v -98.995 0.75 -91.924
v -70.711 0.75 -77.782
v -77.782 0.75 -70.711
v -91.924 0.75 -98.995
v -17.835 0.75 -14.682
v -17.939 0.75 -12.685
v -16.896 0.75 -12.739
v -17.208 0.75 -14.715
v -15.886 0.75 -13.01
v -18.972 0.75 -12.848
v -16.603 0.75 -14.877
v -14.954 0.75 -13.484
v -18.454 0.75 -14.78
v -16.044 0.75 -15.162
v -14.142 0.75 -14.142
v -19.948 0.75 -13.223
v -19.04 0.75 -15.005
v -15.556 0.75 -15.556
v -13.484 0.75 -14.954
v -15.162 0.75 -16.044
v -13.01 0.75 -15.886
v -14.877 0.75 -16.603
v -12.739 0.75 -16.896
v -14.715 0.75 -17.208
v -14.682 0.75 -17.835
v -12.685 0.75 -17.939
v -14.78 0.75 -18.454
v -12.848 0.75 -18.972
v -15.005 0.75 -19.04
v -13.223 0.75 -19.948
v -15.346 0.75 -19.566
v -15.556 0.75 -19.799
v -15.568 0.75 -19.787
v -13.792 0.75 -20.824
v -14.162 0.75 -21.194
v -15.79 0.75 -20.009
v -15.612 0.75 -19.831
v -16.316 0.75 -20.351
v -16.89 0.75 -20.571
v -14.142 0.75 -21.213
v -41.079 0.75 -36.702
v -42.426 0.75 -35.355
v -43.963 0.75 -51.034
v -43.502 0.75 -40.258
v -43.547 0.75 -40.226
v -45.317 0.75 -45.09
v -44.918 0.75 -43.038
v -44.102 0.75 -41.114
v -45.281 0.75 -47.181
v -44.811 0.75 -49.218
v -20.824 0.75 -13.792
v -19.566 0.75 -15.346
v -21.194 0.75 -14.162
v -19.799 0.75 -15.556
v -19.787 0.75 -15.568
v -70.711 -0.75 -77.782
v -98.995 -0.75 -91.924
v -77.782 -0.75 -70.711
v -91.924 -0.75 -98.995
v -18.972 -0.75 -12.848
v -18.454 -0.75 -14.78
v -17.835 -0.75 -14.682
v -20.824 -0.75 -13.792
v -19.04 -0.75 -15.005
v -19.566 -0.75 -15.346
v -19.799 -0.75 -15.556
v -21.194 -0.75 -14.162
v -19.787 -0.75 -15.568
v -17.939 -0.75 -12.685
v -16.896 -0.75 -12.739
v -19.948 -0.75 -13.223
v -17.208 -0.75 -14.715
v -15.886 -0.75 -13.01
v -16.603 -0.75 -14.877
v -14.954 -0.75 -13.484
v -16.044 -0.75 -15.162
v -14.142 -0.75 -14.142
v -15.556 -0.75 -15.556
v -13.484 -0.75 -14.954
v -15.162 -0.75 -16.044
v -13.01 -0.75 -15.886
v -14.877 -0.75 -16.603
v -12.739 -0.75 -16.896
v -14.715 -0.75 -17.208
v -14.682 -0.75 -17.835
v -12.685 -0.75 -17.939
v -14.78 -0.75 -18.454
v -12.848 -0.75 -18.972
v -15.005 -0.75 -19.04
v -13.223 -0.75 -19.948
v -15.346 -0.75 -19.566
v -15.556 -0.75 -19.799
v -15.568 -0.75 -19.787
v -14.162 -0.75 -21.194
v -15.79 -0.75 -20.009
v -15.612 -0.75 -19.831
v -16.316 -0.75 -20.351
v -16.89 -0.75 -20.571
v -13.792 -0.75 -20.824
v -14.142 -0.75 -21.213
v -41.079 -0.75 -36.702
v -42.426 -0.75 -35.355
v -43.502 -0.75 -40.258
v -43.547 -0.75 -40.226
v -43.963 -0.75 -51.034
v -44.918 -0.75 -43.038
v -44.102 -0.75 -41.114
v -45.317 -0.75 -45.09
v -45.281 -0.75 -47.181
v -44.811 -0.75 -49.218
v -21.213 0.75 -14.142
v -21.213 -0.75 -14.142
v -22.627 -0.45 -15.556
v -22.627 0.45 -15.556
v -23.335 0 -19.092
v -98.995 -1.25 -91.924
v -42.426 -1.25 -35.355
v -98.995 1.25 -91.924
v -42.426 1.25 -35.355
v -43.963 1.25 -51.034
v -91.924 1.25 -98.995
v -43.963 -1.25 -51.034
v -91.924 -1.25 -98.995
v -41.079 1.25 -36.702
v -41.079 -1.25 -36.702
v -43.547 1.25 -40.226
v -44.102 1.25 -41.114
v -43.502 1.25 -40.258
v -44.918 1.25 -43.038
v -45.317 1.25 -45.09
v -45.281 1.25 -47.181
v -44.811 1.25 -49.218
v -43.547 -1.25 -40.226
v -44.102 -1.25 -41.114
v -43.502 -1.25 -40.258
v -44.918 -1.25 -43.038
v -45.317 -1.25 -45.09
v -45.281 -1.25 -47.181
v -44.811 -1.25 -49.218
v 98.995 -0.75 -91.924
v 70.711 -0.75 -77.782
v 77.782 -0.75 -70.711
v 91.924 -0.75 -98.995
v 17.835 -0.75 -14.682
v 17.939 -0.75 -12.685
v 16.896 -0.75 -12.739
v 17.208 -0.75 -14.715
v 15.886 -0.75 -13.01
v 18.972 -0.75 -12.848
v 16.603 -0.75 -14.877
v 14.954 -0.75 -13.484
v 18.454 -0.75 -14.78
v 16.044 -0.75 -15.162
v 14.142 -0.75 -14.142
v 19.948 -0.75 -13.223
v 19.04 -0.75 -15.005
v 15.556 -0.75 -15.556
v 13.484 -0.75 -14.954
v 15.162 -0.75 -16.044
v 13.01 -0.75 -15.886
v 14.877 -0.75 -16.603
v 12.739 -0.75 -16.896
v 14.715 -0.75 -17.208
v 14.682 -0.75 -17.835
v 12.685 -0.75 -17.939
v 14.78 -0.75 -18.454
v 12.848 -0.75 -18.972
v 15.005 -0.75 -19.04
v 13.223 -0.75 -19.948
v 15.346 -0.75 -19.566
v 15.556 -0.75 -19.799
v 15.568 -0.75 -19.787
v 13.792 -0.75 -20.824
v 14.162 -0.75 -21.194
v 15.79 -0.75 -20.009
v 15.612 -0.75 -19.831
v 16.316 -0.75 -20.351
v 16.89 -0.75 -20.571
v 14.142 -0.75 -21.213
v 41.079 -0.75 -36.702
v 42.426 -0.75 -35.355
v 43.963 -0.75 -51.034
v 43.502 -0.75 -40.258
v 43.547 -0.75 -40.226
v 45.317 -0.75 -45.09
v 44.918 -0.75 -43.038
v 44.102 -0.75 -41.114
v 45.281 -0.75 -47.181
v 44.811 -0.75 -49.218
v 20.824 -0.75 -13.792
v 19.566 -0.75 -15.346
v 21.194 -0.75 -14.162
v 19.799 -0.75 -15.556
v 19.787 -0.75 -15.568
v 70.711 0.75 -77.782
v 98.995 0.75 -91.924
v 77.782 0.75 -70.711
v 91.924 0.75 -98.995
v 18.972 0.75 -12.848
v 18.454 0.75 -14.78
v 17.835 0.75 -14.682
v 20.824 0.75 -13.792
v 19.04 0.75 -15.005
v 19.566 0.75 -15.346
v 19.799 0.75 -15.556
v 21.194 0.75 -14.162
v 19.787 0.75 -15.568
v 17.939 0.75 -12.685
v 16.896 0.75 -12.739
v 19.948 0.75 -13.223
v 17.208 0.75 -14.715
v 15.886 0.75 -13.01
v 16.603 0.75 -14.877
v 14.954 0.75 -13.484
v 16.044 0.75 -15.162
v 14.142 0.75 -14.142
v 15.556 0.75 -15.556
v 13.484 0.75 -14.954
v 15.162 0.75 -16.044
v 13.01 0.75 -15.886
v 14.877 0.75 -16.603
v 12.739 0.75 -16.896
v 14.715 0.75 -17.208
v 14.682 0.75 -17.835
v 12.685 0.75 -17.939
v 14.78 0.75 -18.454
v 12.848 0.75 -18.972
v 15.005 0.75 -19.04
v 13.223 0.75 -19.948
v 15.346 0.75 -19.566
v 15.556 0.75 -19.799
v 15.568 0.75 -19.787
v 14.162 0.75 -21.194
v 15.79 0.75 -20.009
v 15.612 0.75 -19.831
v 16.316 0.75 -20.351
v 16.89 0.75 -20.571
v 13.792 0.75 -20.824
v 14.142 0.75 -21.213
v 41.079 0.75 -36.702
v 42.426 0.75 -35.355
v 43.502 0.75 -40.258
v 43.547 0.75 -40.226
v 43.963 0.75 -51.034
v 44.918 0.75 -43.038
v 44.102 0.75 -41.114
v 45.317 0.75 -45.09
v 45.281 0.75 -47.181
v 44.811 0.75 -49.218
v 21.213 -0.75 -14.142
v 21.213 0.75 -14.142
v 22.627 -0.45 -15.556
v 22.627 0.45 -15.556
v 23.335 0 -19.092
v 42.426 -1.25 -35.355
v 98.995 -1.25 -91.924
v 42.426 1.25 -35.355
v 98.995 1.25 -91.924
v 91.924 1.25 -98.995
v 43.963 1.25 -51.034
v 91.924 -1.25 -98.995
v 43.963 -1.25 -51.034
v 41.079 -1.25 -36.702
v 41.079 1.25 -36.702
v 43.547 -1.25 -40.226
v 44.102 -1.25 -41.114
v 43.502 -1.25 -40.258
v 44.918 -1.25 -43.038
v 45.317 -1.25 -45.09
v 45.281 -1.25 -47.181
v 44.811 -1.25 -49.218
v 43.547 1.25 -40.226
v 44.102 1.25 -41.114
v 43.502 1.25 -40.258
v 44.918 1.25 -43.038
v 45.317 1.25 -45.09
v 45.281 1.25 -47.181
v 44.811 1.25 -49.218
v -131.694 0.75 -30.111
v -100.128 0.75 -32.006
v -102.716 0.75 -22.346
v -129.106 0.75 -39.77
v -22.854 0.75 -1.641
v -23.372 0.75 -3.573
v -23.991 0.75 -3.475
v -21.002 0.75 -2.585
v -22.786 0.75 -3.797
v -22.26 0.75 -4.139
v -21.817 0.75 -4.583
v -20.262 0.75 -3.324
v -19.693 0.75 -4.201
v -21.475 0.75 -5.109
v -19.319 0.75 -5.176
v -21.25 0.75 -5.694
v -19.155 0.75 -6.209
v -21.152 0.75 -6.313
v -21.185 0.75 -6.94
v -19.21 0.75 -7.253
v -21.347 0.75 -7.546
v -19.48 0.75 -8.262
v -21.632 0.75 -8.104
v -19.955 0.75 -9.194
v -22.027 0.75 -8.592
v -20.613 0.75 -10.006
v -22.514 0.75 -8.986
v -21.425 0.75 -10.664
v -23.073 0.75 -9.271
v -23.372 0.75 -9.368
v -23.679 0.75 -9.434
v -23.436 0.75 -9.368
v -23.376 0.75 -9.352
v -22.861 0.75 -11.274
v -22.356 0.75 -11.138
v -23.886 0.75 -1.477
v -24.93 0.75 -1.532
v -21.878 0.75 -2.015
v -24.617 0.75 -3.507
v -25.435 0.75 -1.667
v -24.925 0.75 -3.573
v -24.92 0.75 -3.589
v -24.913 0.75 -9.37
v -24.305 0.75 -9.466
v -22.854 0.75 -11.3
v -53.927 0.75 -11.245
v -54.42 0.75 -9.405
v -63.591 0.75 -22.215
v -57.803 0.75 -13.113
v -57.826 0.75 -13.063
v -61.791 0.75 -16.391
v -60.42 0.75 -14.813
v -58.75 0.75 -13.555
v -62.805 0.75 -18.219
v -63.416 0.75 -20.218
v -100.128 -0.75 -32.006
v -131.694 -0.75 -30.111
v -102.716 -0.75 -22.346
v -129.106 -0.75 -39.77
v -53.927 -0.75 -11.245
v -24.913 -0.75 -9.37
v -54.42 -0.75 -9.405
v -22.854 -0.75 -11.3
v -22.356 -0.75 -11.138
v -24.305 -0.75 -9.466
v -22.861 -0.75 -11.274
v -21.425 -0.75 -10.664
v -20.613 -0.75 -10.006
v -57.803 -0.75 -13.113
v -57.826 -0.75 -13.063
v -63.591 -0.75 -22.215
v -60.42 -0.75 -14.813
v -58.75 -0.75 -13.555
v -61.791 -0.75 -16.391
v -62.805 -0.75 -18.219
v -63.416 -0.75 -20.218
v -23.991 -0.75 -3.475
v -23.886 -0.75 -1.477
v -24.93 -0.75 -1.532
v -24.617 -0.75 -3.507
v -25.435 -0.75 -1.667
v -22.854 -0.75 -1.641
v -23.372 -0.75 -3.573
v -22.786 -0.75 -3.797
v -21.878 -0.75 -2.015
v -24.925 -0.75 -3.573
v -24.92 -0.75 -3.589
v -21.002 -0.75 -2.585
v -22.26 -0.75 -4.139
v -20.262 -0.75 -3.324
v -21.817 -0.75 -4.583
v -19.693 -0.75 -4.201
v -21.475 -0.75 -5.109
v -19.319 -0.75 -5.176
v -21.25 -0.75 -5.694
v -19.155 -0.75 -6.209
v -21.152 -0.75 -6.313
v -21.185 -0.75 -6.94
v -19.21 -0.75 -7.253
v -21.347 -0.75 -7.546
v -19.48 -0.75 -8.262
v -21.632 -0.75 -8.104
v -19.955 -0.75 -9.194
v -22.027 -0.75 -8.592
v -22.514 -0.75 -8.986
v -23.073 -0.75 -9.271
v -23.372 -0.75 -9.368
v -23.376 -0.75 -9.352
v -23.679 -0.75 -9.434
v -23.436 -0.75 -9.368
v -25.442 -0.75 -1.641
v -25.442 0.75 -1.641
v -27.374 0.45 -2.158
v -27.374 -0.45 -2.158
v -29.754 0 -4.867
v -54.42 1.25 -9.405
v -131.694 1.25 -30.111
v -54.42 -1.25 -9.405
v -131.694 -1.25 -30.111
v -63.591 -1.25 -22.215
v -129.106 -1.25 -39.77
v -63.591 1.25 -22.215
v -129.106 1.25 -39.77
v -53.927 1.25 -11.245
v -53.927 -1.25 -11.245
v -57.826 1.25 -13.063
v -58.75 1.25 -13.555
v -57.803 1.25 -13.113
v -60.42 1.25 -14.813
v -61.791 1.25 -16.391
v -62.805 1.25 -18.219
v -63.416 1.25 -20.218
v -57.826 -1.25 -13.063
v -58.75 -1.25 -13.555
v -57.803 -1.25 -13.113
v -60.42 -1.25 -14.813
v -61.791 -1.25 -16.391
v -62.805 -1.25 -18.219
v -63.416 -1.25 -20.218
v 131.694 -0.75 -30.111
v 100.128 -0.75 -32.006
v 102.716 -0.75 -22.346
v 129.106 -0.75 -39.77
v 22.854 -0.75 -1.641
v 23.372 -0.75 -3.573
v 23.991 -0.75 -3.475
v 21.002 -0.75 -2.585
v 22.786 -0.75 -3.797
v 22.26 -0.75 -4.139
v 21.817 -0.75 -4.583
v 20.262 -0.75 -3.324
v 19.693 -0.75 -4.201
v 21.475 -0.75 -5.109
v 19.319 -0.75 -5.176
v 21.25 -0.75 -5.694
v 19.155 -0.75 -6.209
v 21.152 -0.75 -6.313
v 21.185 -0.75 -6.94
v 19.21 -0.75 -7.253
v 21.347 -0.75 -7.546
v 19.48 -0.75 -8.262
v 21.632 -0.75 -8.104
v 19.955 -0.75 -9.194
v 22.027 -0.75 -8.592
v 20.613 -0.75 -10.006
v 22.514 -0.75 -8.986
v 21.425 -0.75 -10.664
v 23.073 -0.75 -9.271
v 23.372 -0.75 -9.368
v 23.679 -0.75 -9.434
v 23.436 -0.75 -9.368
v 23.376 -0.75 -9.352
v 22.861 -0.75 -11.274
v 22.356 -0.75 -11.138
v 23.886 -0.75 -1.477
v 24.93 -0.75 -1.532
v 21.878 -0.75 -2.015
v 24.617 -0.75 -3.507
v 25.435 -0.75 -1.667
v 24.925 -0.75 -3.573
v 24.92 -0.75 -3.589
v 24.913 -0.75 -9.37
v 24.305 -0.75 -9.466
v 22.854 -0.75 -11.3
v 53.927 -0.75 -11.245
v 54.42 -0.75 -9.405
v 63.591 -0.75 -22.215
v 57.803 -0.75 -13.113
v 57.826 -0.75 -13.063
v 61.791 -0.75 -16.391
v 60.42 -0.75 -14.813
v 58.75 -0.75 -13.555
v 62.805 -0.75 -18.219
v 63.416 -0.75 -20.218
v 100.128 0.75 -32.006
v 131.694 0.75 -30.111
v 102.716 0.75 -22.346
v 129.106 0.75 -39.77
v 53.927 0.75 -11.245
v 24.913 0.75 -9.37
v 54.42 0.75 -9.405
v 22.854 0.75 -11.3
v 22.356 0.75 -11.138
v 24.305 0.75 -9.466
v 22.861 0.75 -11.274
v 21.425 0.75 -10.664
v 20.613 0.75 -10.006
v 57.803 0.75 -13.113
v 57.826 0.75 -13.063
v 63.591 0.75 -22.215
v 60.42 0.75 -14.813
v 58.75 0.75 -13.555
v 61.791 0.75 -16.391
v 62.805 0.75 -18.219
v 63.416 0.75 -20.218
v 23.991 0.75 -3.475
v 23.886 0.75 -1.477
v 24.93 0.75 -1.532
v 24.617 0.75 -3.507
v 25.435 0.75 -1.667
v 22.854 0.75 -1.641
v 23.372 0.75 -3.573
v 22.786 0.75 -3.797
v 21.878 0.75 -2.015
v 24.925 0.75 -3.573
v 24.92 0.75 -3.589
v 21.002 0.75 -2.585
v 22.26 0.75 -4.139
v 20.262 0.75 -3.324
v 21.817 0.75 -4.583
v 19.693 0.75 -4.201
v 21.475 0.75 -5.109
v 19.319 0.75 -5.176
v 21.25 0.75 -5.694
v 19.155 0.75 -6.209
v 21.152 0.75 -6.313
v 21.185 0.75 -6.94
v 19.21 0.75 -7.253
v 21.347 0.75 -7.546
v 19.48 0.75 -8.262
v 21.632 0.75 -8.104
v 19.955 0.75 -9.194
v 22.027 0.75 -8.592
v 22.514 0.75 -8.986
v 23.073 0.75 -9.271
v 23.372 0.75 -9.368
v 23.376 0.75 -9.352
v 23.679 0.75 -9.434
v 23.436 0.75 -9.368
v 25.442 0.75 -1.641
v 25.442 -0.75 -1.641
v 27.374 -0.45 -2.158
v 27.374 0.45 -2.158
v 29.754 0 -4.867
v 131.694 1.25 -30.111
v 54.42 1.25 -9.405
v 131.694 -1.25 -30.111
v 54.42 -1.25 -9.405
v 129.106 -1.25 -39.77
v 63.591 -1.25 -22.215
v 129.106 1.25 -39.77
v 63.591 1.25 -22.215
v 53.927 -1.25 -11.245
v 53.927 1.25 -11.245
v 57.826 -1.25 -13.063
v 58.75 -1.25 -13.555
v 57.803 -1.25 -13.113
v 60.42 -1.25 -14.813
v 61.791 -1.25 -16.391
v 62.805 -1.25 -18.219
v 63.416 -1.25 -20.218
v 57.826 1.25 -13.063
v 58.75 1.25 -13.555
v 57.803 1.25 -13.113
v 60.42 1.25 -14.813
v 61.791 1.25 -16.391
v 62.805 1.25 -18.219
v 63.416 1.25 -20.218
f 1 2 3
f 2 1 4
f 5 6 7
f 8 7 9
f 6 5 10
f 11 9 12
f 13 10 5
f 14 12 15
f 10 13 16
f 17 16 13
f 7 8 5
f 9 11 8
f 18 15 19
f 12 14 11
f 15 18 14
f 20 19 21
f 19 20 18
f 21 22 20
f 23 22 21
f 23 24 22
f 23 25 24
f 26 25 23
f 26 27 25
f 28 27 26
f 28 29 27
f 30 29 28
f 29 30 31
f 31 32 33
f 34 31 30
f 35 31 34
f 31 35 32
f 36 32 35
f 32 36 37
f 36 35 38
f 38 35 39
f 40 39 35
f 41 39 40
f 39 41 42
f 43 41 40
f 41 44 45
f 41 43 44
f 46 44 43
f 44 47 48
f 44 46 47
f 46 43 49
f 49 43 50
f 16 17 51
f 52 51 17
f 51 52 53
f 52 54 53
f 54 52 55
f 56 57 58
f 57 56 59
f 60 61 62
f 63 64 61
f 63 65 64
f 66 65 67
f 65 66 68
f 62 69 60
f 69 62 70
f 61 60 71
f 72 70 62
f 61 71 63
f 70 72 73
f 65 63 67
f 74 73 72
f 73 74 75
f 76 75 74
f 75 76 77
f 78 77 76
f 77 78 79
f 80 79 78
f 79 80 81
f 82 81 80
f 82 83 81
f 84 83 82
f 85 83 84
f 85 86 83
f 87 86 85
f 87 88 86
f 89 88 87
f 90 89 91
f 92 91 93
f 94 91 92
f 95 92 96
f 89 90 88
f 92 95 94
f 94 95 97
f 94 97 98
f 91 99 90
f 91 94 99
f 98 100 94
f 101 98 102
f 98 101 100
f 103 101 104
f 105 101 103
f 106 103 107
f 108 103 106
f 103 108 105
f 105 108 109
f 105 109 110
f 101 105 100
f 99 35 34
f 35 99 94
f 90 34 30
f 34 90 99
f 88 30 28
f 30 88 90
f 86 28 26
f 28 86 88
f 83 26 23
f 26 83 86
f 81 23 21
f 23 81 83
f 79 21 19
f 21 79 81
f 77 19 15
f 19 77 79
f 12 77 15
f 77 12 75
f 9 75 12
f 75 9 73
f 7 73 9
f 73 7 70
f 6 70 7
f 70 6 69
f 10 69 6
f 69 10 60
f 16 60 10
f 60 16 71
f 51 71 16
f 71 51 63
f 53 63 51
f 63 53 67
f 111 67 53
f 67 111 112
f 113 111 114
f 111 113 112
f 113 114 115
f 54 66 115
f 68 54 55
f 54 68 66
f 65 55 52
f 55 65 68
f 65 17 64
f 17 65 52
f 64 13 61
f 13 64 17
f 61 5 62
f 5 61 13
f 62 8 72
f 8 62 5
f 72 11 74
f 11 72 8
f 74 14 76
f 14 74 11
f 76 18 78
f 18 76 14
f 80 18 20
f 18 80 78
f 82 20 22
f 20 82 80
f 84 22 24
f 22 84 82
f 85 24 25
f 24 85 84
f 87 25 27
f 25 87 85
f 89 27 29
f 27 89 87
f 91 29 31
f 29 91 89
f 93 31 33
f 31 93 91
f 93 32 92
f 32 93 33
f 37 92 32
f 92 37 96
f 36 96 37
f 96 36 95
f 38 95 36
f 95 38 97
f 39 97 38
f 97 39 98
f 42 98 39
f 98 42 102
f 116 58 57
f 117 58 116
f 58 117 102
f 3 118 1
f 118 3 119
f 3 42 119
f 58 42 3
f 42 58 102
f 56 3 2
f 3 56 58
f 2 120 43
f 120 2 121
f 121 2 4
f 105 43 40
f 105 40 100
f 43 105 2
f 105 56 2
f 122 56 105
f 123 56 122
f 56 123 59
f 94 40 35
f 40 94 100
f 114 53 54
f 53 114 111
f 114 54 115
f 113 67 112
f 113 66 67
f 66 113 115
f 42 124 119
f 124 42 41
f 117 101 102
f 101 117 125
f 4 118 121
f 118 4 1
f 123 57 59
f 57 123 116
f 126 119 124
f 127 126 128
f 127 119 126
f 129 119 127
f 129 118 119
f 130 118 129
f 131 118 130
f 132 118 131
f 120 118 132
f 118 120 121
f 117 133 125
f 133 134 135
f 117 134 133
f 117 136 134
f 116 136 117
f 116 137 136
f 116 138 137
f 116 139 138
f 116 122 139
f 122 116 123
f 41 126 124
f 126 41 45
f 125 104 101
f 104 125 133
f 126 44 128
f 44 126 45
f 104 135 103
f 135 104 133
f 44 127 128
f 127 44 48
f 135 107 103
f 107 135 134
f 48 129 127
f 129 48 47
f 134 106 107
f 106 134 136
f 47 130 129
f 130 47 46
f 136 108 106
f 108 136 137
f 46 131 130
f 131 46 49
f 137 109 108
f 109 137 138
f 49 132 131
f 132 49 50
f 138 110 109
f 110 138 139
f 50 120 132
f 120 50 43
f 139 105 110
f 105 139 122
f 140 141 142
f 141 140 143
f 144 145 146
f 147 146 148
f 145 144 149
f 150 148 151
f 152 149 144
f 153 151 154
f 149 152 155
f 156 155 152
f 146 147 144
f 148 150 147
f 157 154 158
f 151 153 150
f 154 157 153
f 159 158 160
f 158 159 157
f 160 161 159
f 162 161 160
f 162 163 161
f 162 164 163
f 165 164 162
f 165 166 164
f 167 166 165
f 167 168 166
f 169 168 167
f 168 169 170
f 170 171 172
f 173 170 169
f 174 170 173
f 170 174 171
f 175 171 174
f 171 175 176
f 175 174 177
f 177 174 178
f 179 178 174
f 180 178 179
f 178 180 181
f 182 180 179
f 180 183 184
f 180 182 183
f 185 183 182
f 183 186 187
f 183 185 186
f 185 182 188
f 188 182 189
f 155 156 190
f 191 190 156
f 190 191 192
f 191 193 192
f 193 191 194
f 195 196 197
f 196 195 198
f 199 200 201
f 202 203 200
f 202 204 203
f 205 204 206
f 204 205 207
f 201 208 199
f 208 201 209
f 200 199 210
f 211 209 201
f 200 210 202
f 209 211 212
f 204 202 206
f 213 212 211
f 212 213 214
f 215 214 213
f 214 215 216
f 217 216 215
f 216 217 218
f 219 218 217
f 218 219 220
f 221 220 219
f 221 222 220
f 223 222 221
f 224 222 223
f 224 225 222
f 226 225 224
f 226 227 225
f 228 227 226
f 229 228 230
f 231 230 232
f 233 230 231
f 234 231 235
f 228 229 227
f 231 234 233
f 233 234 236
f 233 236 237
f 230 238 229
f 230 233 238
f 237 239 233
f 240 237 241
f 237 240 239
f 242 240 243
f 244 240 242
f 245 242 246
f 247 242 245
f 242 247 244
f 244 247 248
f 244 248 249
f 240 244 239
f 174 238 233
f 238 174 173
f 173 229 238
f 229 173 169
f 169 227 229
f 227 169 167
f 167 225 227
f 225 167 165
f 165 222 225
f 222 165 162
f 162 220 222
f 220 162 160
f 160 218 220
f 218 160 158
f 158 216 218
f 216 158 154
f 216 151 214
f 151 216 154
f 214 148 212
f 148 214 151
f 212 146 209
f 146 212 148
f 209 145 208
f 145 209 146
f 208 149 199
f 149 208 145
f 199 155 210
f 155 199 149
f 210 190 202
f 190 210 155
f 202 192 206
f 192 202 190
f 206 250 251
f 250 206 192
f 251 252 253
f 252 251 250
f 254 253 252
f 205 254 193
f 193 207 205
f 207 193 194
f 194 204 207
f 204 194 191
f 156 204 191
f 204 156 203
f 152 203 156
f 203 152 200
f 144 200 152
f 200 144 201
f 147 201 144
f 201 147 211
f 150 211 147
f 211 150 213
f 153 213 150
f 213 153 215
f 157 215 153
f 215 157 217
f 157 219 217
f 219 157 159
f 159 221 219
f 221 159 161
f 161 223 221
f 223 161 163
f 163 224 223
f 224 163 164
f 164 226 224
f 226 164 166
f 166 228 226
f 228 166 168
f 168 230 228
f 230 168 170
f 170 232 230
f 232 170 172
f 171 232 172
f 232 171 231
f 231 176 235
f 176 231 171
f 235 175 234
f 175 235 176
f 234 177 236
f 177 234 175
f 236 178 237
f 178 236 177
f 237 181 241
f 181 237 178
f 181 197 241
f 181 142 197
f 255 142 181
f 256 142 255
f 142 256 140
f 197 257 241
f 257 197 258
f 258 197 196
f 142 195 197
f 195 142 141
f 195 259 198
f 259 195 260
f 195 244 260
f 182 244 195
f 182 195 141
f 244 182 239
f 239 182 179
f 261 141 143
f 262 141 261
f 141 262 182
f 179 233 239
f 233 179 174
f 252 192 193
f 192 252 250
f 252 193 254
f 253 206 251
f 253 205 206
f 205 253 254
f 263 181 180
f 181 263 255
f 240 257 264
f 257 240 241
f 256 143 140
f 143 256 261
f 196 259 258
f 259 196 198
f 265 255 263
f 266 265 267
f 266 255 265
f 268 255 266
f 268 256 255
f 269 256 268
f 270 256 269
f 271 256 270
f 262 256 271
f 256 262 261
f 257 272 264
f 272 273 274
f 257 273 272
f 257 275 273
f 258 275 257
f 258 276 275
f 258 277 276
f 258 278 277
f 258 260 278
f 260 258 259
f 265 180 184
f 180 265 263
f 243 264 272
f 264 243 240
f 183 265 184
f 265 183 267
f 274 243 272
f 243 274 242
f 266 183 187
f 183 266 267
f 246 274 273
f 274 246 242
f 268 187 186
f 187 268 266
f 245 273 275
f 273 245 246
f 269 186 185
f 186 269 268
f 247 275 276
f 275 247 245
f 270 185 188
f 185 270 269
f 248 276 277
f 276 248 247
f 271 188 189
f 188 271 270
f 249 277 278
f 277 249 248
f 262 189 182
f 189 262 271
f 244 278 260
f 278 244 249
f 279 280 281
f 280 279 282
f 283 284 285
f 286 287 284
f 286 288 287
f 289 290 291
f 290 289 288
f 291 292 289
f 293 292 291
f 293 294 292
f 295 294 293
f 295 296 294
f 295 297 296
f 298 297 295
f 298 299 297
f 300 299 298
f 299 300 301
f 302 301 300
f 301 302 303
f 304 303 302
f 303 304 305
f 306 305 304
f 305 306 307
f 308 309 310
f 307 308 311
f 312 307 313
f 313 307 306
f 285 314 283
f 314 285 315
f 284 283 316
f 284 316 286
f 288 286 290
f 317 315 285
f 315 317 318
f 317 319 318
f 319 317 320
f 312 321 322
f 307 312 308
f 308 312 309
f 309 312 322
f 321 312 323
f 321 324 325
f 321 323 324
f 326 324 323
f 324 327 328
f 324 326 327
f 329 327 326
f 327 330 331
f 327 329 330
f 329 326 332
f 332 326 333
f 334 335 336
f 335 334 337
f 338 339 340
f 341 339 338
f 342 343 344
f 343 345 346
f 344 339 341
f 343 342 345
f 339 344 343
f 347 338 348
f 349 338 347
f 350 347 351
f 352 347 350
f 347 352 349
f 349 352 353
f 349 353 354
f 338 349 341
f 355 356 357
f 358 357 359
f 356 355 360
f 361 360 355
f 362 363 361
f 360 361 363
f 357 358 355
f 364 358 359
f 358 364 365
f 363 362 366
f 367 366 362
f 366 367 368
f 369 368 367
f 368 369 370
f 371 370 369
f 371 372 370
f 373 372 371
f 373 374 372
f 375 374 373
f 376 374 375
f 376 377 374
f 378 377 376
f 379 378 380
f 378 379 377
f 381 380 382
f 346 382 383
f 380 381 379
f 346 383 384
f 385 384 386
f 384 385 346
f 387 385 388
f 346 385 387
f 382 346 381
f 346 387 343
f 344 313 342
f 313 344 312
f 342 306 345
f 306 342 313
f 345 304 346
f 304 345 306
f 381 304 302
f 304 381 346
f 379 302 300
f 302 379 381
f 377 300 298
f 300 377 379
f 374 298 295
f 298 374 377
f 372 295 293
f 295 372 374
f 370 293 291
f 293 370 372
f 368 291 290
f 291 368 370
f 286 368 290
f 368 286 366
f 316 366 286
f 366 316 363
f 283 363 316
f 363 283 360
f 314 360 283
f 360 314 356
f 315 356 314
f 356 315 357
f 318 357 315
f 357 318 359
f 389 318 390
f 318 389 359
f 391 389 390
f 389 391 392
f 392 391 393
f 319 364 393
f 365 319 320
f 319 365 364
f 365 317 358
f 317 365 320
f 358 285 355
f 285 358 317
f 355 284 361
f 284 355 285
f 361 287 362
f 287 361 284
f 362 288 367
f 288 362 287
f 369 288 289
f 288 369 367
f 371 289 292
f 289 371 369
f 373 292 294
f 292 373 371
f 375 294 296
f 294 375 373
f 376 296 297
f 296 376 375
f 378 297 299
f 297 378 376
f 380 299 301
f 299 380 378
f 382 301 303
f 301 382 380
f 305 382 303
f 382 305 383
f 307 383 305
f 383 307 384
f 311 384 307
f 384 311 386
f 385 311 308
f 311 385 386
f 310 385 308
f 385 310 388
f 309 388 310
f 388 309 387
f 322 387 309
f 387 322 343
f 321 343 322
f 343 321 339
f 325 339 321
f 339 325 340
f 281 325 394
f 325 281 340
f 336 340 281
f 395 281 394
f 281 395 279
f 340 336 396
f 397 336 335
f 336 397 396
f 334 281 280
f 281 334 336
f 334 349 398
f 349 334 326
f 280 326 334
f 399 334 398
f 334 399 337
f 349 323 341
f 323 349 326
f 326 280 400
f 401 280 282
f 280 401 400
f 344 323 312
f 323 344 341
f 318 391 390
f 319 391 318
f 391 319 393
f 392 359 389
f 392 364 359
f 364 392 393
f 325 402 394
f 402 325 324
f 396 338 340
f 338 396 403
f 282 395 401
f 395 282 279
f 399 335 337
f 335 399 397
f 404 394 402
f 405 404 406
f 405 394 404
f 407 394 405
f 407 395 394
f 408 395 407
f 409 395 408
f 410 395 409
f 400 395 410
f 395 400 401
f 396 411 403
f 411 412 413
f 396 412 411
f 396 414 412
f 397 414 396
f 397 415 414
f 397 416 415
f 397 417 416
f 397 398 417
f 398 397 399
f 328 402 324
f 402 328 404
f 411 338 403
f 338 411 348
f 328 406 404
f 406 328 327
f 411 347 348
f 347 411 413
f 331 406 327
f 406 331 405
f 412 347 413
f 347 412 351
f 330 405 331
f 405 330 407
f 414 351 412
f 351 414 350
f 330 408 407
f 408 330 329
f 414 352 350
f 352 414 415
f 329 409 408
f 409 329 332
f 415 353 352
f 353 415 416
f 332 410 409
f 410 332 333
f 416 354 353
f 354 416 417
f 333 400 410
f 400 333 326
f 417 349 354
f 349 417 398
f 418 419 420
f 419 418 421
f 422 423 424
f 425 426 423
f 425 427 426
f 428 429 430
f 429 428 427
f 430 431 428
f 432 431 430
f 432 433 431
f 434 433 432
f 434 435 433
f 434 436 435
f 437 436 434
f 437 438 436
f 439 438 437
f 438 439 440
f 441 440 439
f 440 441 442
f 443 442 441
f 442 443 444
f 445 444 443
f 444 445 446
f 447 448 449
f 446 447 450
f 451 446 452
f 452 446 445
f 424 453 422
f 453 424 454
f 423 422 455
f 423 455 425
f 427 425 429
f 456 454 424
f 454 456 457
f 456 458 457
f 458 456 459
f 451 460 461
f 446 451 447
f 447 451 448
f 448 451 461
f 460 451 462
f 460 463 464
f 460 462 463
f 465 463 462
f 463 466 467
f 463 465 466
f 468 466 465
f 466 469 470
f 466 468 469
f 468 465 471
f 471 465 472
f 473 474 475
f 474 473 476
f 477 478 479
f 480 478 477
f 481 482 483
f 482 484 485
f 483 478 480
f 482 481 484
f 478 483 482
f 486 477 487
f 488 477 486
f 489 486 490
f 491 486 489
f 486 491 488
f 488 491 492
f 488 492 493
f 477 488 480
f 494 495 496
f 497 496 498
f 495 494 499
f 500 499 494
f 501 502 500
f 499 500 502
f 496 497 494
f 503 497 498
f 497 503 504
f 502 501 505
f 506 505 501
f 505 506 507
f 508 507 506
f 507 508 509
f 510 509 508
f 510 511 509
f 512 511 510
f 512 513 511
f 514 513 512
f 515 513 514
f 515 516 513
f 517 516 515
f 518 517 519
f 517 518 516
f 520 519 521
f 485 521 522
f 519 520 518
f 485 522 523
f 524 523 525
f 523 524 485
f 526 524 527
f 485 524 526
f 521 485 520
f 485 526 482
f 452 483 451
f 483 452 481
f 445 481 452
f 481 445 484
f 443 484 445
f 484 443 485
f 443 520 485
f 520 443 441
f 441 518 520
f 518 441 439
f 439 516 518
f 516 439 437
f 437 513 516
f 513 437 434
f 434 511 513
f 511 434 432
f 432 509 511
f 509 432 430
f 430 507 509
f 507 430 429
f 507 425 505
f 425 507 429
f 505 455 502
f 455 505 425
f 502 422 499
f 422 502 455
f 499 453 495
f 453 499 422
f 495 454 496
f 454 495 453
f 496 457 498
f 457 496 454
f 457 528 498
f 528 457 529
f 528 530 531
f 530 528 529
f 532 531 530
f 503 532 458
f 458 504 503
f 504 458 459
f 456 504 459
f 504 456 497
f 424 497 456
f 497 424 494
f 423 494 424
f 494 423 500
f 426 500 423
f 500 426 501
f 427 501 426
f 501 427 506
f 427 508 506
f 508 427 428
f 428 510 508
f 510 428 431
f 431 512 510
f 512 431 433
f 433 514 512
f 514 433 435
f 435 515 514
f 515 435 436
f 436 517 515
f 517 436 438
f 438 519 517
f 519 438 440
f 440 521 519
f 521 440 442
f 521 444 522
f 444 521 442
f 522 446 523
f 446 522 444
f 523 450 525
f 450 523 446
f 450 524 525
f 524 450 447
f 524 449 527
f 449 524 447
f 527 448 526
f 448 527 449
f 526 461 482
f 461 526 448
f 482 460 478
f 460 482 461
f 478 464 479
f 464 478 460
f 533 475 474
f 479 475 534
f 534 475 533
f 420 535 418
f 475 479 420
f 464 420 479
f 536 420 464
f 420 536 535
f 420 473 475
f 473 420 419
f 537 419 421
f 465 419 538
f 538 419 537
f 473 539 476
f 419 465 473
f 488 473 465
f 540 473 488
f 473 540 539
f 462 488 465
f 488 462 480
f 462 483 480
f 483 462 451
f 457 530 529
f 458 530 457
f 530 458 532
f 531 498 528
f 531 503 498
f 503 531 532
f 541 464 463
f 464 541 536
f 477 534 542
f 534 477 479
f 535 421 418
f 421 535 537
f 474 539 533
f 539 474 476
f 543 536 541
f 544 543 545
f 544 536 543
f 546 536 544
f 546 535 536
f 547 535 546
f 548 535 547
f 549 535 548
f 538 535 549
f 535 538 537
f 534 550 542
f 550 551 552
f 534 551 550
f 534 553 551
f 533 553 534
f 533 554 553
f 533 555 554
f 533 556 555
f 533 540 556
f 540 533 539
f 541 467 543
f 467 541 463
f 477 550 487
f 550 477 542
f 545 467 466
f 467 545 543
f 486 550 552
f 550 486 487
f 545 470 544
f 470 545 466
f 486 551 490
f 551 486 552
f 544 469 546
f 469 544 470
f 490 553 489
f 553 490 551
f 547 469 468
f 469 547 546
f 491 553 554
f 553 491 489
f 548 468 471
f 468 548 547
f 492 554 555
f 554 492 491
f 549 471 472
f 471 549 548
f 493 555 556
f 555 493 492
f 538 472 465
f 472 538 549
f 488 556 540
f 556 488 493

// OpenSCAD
length=80;

backoff = 25;

hook_thickness=1.5;
hook_length=30;
hook_rake=5;

od=10;

pos_rest =      [0, 0];
pos_open =      [backoff + 2*hook_rake, backoff+hook_rake];
pos_closed =    [backoff, backoff+hook_length];
pos_transfer =  [0, backoff+hook_length + 1.5*hook_rake];
pos_pickup =    [backoff + 2.5*hook_rake, backoff+hook_rake];


// front bottom
rotate([0,-45,0]) {
    translate([-backoff, 0, 0]) {
        compound_needle(pos_rest);
    }
}

// back bottom
rotate([0,-45,180]) {
    translate([-backoff, 0, 0]) {
        compound_needle(pos_rest);
    }
}

// front top
rotate([0,-15,0]) {
    translate([-backoff, 0, 0]) {
        compound_needle(pos_rest);
    }
}

// back top
rotate([0,-15,180]) {
    translate([-backoff, 0, 0]) {
        compound_needle(pos_rest);
    }
}

module compound_needle(pos=[0,0]) {
    
    translate([pos[0],0,0]) {
        hook();
    }
    
    translate([-hook_length+pos[1],0,0]) {
        closing_element();
    }
}

module hook() {
    
    id=6;
    
    
    
    
    
    
    translate([-hook_length,0,0]) {    
        difference() {
            rotate([90,0,0]) {
                linear_extrude(height=hook_thickness, center=true) {
                    difference() {
                        union() {
                            
                            // Shaft
                            translate([-length+hook_length,-od/2]) {
                                square([length,od]);
                            }
                            
                            // Tip
                            translate([hook_length,0]) {
                                circle(d=od, $fn=30);
                            }
                        }
                        
                        union() {
                            // Circle
                            translate([hook_length,0]) {
                                circle(d=id, $fn=30);
                            }
                            
                            polygon(points=[
                                    [0,od/2],
                                    [hook_length,-id/2],
                                    [hook_length,id/2],
                                    [hook_length-hook_rake, id/2],
                                    [hook_length-hook_rake/2.5, od/2],
                                    [hook_length-hook_rake, od/2]
                                ]);
                        }
                    }
                }
            }
            
            //taper
            linear_extrude(height=od/2) {
                polygon(points=[
                    [hook_length-hook_rake-1,hook_thickness/2],
                    [hook_length,hook_thickness/2],
                    [hook_length-hook_rake,0],
                    [hook_length,-hook_thickness/2],
                    [hook_length-hook_rake-1,-hook_thickness/2],
                ]);
            }
        }
    }
}

module closing_element() {
 
    thickness=0.5;
    
    _t = thickness*2 + hook_thickness;
    
    difference() {
        translate([-hook_length, 0,0]) {
            difference() {
            
                translate([-length+hook_length, -_t/2, -od/2]) {            
                    cube([length, _t, od]);
                }
                
                translate([-length+hook_length,-hook_thickness/2,-od/2]) {
                    cube([length, hook_thickness, od]);
                }
            }
        }
        
        translate([-hook_rake/2,0,-od/4-od/2]) {
            rotate([90,-10,0]) {
                linear_extrude(height=_t, center=true) {
                    union() {
                        circle(r=od, $fn=30);
                    }
                    translate([0,0,0]) {
                        square([od,od]);
                    }
                }
            }
        }
    }
}
